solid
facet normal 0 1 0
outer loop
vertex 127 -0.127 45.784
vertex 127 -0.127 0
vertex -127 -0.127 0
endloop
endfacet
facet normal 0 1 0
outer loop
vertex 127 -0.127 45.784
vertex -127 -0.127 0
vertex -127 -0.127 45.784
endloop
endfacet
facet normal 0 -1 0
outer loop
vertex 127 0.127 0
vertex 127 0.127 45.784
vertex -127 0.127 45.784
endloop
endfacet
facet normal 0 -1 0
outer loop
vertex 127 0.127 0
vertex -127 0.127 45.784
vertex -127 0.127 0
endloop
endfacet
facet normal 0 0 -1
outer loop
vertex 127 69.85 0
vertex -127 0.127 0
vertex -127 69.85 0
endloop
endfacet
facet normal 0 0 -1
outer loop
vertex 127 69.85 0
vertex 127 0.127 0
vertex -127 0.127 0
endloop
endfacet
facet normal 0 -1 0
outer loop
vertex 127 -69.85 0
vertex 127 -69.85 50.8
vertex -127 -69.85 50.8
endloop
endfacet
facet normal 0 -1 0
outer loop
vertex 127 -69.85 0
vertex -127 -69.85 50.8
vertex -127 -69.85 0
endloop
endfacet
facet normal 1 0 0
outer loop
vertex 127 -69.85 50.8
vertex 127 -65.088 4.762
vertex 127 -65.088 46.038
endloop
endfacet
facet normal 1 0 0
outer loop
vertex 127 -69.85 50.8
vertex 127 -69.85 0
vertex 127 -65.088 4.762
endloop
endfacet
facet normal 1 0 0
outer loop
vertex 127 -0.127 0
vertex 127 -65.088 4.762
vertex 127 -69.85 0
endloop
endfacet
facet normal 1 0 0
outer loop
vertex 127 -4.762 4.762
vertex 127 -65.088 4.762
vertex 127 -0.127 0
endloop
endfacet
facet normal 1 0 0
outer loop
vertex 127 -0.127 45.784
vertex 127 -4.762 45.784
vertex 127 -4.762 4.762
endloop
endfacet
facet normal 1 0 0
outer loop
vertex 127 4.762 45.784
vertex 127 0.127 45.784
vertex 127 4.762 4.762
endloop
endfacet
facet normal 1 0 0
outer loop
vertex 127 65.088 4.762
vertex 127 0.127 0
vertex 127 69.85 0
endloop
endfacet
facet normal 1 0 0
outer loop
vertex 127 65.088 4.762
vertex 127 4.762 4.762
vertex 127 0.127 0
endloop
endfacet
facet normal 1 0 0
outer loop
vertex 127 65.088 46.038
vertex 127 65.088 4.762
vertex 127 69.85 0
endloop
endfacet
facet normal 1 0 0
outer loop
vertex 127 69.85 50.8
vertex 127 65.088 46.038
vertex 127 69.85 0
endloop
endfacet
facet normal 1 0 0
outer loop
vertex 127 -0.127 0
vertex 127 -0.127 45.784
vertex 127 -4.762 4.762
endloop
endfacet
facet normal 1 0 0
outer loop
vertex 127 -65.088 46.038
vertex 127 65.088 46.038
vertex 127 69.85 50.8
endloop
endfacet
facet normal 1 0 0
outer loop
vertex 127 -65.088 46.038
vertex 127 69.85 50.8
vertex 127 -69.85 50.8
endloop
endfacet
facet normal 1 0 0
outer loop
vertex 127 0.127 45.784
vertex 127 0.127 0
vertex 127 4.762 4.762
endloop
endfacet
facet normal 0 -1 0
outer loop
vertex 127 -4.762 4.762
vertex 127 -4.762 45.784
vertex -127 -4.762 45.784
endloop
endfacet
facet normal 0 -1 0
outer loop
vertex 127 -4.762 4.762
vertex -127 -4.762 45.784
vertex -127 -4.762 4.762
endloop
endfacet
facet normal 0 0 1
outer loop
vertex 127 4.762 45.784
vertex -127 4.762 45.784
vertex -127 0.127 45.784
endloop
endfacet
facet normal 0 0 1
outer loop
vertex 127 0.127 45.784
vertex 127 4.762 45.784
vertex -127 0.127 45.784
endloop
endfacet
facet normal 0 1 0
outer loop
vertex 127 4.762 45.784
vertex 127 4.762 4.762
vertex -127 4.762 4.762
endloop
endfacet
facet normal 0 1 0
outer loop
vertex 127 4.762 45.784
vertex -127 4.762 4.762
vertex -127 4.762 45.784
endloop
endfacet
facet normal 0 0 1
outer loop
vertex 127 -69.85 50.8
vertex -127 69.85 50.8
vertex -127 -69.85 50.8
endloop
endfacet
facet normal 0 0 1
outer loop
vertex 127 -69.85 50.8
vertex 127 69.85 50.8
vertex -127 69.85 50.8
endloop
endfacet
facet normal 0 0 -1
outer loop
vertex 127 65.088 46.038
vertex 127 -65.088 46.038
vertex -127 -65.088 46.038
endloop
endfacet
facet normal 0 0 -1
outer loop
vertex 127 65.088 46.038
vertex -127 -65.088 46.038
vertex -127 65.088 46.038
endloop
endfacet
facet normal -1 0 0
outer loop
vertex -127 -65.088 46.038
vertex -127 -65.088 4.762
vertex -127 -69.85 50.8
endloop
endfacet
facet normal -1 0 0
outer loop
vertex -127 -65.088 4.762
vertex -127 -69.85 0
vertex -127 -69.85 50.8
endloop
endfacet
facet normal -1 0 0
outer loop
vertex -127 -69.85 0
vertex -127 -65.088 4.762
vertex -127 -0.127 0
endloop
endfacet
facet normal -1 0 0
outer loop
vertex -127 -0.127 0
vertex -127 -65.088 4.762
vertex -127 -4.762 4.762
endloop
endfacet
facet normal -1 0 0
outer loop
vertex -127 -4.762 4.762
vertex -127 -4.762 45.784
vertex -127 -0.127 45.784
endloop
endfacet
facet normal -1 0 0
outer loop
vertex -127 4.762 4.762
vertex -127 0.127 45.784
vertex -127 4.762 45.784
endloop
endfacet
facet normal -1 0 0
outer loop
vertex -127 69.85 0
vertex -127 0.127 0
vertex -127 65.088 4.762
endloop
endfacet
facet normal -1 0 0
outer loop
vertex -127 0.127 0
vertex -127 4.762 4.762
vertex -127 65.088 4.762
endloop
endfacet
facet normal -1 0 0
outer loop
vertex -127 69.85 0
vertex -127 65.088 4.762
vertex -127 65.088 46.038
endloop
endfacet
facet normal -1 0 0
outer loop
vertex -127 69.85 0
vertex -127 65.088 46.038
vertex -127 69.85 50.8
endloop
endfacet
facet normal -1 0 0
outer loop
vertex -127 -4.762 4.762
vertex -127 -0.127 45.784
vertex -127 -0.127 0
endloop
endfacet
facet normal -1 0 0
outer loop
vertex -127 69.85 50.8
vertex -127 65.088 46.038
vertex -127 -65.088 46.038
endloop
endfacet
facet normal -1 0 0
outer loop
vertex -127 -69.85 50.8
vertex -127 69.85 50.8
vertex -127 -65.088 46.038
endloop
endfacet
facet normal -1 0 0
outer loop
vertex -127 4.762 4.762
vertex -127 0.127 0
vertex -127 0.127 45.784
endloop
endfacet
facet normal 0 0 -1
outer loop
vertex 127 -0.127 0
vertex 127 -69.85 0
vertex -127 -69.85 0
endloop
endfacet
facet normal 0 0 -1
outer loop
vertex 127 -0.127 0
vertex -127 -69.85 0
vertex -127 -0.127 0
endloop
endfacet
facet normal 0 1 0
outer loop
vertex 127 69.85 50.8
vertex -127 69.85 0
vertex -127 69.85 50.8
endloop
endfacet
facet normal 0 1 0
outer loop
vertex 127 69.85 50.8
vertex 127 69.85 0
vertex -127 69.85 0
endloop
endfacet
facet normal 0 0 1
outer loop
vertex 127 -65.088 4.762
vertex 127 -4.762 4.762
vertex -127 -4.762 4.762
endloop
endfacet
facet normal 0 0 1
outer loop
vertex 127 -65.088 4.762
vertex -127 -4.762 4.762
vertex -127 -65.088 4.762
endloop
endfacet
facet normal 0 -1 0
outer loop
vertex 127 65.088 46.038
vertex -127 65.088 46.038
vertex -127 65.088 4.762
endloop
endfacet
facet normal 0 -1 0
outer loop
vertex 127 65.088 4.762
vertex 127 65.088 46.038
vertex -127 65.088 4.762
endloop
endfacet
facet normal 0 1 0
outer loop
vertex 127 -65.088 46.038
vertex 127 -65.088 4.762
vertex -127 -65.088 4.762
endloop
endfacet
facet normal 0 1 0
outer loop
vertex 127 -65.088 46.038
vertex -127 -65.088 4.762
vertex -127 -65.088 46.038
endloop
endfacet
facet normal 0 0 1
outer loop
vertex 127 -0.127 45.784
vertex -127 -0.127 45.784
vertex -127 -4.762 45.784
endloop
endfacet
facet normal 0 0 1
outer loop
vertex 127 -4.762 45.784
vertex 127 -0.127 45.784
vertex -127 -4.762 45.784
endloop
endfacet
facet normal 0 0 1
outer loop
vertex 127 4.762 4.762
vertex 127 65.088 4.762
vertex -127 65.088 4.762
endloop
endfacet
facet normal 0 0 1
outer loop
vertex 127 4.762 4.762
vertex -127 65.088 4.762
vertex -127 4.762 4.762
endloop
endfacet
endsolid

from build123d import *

# Parameters (mm, degrees)
F1_DEPTH = 127


with BuildPart() as f1:
    # F0 (on Right) → F1 (new body, symmetric)
    with BuildSketch(Plane.YZ):
        Polygon((69.85, 50.8), (-69.85, 50.8), (-69.85, 0), (-0.127, 0), (-0.127, 45.7835), (-4.7625, 45.7835), (-4.7625, 4.7625), (-65.0875, 4.7625), (-65.0875, 46.0375), (65.0875, 46.0375), (65.0875, 4.7625), (4.7625, 4.7625), (4.7625, 45.7835), (0.127, 45.7835), (0.127, 0), (69.85, 0), align=None)
    extrude(amount=F1_DEPTH, both=True)


solid = f1.part
